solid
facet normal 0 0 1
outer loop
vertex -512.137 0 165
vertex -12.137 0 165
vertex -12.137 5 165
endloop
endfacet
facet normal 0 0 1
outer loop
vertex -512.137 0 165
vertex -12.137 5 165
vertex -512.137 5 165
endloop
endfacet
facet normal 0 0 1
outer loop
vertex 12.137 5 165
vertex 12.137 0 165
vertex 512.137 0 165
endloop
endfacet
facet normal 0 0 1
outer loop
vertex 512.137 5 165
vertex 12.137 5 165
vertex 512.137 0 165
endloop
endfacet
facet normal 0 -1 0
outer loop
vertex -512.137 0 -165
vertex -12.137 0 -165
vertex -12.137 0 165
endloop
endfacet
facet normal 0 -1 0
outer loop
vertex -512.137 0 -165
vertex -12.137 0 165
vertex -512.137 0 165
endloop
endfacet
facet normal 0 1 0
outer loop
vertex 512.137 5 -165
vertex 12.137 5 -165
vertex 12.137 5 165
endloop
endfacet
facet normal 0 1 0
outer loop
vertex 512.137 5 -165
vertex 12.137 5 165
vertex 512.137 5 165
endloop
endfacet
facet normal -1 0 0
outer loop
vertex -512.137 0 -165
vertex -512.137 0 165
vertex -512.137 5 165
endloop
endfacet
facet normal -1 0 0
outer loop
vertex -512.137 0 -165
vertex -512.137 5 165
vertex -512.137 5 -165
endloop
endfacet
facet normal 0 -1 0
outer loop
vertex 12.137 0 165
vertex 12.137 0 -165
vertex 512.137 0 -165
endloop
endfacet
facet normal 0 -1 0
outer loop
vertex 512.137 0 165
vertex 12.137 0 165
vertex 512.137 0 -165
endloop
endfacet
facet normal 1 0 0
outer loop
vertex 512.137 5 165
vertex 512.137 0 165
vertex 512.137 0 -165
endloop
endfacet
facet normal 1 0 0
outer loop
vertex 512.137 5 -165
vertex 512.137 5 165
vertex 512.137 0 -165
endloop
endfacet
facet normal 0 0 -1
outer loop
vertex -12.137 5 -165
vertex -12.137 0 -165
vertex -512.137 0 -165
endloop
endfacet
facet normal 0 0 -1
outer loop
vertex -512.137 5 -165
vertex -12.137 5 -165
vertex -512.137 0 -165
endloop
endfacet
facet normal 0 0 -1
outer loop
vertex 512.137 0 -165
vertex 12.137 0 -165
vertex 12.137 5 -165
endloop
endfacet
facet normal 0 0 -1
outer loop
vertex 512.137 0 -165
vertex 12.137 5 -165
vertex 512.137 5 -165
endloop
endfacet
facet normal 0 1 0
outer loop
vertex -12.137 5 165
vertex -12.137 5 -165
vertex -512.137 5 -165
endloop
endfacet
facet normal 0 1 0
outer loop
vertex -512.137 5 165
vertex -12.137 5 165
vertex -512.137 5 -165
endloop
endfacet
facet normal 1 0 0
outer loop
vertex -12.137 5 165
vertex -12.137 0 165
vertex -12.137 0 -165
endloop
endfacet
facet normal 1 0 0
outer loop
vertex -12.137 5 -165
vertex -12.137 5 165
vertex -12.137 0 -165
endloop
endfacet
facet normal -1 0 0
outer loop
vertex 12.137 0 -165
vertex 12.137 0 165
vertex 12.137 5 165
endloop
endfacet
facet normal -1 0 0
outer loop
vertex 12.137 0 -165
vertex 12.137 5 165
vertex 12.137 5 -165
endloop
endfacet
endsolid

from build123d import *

# Parameters (mm, degrees)
SKETCH1_W           = 500
SKETCH1_H           = 330
BOSS_EXTRUDE1_DEPTH = 5


with BuildPart() as part:
    # Sketch1 → Boss-Extrude1 (new body)
    with BuildSketch(Plane(origin=(0, 0, 0), x_dir=(1, 0, 0), z_dir=(0, 1, 0))):
        with Locations((262.136899299, 0)):
            Rectangle(SKETCH1_W, SKETCH1_H)
    extrude(amount=BOSS_EXTRUDE1_DEPTH)


with BuildPart() as body_2:
    # Mirror3: mirrored copy
    add(part.part.mirror(Plane(origin=(0, 0, 0), x_dir=(0, 0, 1), z_dir=(1, 0, 0))))


solid = Compound([part.part, body_2.part])
